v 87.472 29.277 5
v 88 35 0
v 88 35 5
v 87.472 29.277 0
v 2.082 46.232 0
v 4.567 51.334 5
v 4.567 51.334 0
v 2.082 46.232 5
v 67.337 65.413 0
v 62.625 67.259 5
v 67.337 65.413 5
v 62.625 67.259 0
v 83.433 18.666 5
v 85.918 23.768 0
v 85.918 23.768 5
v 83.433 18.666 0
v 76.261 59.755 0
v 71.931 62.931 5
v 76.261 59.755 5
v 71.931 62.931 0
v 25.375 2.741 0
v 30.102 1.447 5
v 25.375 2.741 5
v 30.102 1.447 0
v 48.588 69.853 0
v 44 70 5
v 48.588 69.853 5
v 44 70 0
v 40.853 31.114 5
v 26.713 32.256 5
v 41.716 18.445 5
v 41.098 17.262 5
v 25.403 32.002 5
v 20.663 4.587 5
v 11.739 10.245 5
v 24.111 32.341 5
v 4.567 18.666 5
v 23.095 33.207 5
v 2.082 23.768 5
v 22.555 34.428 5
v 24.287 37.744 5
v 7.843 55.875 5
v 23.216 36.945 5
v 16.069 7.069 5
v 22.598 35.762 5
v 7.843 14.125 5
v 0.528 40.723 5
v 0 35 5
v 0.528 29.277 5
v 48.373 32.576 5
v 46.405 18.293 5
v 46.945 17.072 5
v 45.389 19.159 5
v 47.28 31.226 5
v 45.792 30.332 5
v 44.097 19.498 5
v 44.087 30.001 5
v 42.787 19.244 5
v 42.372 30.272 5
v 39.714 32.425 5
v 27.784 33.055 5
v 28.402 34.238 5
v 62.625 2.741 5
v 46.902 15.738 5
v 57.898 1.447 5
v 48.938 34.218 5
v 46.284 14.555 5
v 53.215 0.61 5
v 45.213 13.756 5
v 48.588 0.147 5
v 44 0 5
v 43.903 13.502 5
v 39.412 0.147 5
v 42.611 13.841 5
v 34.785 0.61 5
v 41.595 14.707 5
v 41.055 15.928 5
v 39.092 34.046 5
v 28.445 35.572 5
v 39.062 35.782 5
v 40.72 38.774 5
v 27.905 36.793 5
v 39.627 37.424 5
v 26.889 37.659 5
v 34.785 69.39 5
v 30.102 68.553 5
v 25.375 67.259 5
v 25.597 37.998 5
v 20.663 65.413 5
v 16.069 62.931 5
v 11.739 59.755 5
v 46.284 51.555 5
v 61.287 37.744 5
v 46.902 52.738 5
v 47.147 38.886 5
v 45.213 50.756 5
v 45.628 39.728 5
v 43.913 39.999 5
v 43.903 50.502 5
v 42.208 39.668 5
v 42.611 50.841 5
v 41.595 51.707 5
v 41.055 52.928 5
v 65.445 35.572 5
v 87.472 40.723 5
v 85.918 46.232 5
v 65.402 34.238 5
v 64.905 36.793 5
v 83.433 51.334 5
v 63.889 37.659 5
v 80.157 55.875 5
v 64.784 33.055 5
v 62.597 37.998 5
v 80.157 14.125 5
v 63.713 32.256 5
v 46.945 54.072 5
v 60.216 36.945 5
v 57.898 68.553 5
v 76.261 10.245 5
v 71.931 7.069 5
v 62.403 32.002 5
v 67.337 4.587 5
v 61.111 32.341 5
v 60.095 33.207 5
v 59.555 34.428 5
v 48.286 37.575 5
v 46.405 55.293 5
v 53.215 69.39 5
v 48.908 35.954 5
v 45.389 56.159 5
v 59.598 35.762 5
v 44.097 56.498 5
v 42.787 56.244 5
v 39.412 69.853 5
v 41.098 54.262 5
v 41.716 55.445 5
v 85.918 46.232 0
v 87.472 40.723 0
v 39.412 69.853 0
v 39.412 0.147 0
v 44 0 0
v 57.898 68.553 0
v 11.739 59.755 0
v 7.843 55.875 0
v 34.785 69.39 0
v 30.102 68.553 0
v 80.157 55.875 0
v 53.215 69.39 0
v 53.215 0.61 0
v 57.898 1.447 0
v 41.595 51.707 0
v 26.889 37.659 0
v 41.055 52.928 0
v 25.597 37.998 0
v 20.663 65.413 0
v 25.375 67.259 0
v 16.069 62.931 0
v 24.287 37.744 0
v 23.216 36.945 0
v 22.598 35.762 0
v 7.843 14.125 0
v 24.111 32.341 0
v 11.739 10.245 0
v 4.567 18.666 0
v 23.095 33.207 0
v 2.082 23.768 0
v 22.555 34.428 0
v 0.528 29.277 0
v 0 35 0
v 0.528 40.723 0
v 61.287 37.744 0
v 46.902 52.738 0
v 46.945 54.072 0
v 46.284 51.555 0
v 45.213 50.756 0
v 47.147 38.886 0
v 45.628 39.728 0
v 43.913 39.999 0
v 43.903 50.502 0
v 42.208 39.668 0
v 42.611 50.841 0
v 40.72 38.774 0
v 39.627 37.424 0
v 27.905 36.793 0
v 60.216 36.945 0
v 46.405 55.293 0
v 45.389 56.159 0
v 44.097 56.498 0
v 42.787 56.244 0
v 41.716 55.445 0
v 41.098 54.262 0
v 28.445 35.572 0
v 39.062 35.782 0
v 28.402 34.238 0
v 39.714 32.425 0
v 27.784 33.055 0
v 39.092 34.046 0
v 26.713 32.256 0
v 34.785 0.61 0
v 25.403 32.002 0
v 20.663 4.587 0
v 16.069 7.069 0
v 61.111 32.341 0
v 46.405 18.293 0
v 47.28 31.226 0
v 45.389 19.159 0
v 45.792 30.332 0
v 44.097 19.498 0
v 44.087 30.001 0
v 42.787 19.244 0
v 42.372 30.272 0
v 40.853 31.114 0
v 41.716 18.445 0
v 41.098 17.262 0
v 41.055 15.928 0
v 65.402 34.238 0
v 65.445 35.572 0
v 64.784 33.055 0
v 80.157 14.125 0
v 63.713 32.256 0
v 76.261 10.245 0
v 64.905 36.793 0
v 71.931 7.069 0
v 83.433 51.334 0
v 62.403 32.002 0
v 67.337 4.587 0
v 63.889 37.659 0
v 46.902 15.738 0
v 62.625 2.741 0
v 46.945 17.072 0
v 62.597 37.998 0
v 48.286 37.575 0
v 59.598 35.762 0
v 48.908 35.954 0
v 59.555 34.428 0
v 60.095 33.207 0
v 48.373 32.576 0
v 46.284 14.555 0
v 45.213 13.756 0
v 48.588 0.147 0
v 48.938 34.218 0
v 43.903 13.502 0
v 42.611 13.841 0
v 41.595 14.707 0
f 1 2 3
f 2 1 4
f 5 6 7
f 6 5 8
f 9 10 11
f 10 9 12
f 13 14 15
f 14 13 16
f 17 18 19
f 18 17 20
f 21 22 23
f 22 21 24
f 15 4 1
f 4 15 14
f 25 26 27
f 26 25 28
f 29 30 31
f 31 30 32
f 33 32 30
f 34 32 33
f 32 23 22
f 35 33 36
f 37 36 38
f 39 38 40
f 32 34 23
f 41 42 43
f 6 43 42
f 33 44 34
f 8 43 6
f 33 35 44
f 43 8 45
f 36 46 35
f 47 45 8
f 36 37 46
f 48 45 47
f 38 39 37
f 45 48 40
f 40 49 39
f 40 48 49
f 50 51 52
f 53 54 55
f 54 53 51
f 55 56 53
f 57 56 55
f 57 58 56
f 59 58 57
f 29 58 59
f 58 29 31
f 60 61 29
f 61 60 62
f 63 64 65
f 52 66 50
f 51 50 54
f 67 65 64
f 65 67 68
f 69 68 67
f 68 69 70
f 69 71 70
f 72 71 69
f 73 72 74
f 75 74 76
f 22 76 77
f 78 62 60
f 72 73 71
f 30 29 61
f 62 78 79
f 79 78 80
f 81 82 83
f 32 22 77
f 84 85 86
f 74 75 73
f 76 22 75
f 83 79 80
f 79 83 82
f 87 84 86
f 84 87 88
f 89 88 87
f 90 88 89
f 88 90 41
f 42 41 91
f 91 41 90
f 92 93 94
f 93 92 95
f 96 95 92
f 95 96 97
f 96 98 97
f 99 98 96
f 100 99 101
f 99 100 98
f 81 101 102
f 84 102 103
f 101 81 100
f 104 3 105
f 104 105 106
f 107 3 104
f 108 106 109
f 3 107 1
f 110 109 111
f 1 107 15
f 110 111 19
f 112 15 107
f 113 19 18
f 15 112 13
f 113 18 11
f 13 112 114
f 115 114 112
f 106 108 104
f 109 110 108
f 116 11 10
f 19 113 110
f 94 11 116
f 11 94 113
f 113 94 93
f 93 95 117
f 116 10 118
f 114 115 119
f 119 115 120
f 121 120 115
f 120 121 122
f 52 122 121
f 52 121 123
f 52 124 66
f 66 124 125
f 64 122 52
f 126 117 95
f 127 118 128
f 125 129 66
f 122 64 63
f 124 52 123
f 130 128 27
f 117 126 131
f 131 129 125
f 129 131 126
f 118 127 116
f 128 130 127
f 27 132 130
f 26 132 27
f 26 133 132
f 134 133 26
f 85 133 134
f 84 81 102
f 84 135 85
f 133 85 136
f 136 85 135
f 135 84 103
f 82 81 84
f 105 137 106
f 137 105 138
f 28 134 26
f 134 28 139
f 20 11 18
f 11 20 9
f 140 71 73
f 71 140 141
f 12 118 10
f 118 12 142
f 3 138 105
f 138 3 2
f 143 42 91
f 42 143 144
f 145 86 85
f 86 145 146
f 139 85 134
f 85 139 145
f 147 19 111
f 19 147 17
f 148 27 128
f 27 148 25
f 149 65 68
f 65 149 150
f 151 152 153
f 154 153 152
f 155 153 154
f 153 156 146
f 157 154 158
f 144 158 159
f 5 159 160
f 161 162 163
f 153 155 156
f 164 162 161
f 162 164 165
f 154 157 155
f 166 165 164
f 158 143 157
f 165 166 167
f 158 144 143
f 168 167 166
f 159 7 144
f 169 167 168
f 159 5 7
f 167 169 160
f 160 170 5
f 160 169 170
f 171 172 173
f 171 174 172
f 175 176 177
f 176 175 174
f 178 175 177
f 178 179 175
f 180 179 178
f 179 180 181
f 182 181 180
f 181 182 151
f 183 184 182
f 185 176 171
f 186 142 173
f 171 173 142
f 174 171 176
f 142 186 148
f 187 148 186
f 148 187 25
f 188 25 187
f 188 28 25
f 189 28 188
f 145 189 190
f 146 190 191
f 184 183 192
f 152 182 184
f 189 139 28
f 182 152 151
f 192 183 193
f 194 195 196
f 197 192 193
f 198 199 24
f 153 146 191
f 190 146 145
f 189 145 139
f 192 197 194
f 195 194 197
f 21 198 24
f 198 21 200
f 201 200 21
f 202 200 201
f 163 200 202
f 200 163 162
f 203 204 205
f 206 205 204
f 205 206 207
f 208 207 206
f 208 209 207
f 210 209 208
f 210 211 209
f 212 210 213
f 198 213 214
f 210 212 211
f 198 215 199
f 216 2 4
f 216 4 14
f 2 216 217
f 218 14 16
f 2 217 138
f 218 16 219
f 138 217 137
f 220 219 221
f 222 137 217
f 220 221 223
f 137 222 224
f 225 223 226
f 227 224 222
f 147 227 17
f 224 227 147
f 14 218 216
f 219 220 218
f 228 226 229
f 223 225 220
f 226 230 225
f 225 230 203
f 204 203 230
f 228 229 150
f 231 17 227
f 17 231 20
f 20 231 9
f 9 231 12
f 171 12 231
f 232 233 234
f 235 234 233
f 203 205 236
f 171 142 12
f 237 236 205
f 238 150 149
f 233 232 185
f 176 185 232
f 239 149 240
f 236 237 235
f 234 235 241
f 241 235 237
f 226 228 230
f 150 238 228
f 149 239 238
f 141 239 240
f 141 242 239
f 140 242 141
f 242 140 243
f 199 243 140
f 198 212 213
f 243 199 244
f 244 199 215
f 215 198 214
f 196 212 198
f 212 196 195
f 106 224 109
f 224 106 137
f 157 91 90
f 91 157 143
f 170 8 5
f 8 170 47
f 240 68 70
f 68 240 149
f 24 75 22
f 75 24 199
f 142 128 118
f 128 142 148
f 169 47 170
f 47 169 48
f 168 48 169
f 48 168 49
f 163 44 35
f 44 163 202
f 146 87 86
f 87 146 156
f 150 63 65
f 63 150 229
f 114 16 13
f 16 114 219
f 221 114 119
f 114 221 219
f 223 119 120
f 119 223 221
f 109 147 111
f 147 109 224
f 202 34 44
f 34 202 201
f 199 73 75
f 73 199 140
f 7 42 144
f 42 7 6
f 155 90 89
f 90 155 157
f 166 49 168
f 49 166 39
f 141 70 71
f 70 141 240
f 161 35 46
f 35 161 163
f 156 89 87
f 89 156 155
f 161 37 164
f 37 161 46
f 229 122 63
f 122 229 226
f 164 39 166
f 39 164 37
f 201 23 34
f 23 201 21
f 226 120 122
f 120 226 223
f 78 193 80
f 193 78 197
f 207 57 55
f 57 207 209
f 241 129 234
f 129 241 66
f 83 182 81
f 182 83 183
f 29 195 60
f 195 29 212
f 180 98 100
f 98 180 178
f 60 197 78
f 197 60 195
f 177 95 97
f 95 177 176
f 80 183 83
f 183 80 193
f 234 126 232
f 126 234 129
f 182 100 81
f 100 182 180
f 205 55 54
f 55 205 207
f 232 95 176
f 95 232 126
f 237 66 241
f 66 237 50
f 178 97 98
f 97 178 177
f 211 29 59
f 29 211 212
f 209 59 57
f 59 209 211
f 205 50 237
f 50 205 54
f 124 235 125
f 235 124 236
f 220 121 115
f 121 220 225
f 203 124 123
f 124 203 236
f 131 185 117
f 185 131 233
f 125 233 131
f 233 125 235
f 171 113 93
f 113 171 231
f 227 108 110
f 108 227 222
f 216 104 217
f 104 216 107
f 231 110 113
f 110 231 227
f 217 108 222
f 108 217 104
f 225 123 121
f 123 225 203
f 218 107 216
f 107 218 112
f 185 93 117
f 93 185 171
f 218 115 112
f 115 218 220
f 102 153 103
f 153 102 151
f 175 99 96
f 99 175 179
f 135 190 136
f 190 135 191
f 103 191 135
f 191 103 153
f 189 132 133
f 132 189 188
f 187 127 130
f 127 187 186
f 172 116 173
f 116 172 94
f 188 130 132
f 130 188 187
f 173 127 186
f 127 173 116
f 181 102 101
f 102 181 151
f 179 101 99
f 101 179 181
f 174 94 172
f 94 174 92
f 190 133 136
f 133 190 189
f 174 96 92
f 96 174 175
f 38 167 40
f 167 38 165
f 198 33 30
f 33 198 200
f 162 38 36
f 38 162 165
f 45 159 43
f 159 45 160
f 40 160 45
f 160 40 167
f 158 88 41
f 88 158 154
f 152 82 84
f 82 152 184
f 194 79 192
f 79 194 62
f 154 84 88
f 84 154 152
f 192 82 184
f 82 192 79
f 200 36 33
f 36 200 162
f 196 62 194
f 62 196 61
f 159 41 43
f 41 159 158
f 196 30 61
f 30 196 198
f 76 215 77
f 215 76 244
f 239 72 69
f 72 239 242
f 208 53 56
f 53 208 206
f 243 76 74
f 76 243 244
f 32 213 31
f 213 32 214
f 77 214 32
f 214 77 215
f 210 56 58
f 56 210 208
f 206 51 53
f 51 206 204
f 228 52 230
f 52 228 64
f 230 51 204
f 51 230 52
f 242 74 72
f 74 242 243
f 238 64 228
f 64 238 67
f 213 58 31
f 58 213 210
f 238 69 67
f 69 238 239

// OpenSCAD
$fn = 32;

// ----------------------------------------------------------------------
// Cam plate: double_lobe cam, base R32
// ----------------------------------------------------------------------

// --- parameters (mm) ---
base_r = 32;              // base circle radius
lobe_h = 12;              // cam lobe rise
bore_r = 5;               // shaft bore radius
plate_t = 5;              // plate thickness, Z (extrusion height)
ring_r = 18.5;            // lightening ring radius
bolt_r = 3;               // lightening hole radius

profile = [[88, 35], [87.472, 40.723], [85.918, 46.232], [83.433, 51.334], [80.157, 55.875], [76.261, 59.755], [71.931, 62.931], [67.337, 65.413], [62.625, 67.259], [57.898, 68.553], [53.215, 69.39], [48.588, 69.853], [44, 70], [39.412, 69.853], [34.785, 69.39], [30.102, 68.553], [25.375, 67.259], [20.663, 65.413], [16.069, 62.931], [11.739, 59.755], [7.843, 55.875], [4.567, 51.334], [2.082, 46.232], [0.528, 40.723], [0, 35], [0.528, 29.277], [2.082, 23.768], [4.567, 18.666], [7.843, 14.125], [11.739, 10.245], [16.069, 7.069], [20.663, 4.587], [25.375, 2.741], [30.102, 1.447], [34.785, 0.61], [39.412, 0.147], [44, 0], [48.588, 0.147], [53.215, 0.61], [57.898, 1.447], [62.625, 2.741], [67.337, 4.587], [71.931, 7.069], [76.261, 10.245], [80.157, 14.125], [83.433, 18.666], [85.918, 23.768], [87.472, 29.277]];  // primary outline, 48 points, counter clockwise
void_1 = [[48.908, 35.954], [48.286, 37.575], [47.147, 38.886], [45.628, 39.728], [43.913, 39.999], [42.208, 39.668], [40.72, 38.774], [39.627, 37.424], [39.062, 35.782], [39.092, 34.046], [39.714, 32.425], [40.853, 31.114], [42.372, 30.272], [44.087, 30.001], [45.792, 30.332], [47.28, 31.226], [48.373, 32.576], [48.938, 34.218]];  // shaft bore, 18 points
void_2 = [[65.445, 35.572], [64.905, 36.793], [63.889, 37.659], [62.597, 37.998], [61.287, 37.744], [60.216, 36.945], [59.598, 35.762], [59.555, 34.428], [60.095, 33.207], [61.111, 32.341], [62.403, 32.002], [63.713, 32.256], [64.784, 33.055], [65.402, 34.238]];  // lightening hole 1, 14 points
void_3 = [[46.945, 54.072], [46.405, 55.293], [45.389, 56.159], [44.097, 56.498], [42.787, 56.244], [41.716, 55.445], [41.098, 54.262], [41.055, 52.928], [41.595, 51.707], [42.611, 50.841], [43.903, 50.502], [45.213, 50.756], [46.284, 51.555], [46.902, 52.738]];  // lightening hole 2, 14 points
void_4 = [[28.445, 35.572], [27.905, 36.793], [26.889, 37.659], [25.597, 37.998], [24.287, 37.744], [23.216, 36.945], [22.598, 35.762], [22.555, 34.428], [23.095, 33.207], [24.111, 32.341], [25.403, 32.002], [26.713, 32.256], [27.784, 33.055], [28.402, 34.238]];  // lightening hole 3, 14 points
void_5 = [[46.945, 17.072], [46.405, 18.293], [45.389, 19.159], [44.097, 19.498], [42.787, 19.244], [41.716, 18.445], [41.098, 17.262], [41.055, 15.928], [41.595, 14.707], [42.611, 13.841], [43.903, 13.502], [45.213, 13.756], [46.284, 14.555], [46.902, 15.738]];  // lightening hole 4, 14 points

// --- the one profile operation ---
difference() {
  linear_extrude(height = plate_t) polygon(points = profile);
  translate([0, 0, -1])
    linear_extrude(height = plate_t + 2) polygon(points = void_1);
  translate([0, 0, -1])
    linear_extrude(height = plate_t + 2) polygon(points = void_2);
  translate([0, 0, -1])
    linear_extrude(height = plate_t + 2) polygon(points = void_3);
  translate([0, 0, -1])
    linear_extrude(height = plate_t + 2) polygon(points = void_4);
  translate([0, 0, -1])
    linear_extrude(height = plate_t + 2) polygon(points = void_5);
}
